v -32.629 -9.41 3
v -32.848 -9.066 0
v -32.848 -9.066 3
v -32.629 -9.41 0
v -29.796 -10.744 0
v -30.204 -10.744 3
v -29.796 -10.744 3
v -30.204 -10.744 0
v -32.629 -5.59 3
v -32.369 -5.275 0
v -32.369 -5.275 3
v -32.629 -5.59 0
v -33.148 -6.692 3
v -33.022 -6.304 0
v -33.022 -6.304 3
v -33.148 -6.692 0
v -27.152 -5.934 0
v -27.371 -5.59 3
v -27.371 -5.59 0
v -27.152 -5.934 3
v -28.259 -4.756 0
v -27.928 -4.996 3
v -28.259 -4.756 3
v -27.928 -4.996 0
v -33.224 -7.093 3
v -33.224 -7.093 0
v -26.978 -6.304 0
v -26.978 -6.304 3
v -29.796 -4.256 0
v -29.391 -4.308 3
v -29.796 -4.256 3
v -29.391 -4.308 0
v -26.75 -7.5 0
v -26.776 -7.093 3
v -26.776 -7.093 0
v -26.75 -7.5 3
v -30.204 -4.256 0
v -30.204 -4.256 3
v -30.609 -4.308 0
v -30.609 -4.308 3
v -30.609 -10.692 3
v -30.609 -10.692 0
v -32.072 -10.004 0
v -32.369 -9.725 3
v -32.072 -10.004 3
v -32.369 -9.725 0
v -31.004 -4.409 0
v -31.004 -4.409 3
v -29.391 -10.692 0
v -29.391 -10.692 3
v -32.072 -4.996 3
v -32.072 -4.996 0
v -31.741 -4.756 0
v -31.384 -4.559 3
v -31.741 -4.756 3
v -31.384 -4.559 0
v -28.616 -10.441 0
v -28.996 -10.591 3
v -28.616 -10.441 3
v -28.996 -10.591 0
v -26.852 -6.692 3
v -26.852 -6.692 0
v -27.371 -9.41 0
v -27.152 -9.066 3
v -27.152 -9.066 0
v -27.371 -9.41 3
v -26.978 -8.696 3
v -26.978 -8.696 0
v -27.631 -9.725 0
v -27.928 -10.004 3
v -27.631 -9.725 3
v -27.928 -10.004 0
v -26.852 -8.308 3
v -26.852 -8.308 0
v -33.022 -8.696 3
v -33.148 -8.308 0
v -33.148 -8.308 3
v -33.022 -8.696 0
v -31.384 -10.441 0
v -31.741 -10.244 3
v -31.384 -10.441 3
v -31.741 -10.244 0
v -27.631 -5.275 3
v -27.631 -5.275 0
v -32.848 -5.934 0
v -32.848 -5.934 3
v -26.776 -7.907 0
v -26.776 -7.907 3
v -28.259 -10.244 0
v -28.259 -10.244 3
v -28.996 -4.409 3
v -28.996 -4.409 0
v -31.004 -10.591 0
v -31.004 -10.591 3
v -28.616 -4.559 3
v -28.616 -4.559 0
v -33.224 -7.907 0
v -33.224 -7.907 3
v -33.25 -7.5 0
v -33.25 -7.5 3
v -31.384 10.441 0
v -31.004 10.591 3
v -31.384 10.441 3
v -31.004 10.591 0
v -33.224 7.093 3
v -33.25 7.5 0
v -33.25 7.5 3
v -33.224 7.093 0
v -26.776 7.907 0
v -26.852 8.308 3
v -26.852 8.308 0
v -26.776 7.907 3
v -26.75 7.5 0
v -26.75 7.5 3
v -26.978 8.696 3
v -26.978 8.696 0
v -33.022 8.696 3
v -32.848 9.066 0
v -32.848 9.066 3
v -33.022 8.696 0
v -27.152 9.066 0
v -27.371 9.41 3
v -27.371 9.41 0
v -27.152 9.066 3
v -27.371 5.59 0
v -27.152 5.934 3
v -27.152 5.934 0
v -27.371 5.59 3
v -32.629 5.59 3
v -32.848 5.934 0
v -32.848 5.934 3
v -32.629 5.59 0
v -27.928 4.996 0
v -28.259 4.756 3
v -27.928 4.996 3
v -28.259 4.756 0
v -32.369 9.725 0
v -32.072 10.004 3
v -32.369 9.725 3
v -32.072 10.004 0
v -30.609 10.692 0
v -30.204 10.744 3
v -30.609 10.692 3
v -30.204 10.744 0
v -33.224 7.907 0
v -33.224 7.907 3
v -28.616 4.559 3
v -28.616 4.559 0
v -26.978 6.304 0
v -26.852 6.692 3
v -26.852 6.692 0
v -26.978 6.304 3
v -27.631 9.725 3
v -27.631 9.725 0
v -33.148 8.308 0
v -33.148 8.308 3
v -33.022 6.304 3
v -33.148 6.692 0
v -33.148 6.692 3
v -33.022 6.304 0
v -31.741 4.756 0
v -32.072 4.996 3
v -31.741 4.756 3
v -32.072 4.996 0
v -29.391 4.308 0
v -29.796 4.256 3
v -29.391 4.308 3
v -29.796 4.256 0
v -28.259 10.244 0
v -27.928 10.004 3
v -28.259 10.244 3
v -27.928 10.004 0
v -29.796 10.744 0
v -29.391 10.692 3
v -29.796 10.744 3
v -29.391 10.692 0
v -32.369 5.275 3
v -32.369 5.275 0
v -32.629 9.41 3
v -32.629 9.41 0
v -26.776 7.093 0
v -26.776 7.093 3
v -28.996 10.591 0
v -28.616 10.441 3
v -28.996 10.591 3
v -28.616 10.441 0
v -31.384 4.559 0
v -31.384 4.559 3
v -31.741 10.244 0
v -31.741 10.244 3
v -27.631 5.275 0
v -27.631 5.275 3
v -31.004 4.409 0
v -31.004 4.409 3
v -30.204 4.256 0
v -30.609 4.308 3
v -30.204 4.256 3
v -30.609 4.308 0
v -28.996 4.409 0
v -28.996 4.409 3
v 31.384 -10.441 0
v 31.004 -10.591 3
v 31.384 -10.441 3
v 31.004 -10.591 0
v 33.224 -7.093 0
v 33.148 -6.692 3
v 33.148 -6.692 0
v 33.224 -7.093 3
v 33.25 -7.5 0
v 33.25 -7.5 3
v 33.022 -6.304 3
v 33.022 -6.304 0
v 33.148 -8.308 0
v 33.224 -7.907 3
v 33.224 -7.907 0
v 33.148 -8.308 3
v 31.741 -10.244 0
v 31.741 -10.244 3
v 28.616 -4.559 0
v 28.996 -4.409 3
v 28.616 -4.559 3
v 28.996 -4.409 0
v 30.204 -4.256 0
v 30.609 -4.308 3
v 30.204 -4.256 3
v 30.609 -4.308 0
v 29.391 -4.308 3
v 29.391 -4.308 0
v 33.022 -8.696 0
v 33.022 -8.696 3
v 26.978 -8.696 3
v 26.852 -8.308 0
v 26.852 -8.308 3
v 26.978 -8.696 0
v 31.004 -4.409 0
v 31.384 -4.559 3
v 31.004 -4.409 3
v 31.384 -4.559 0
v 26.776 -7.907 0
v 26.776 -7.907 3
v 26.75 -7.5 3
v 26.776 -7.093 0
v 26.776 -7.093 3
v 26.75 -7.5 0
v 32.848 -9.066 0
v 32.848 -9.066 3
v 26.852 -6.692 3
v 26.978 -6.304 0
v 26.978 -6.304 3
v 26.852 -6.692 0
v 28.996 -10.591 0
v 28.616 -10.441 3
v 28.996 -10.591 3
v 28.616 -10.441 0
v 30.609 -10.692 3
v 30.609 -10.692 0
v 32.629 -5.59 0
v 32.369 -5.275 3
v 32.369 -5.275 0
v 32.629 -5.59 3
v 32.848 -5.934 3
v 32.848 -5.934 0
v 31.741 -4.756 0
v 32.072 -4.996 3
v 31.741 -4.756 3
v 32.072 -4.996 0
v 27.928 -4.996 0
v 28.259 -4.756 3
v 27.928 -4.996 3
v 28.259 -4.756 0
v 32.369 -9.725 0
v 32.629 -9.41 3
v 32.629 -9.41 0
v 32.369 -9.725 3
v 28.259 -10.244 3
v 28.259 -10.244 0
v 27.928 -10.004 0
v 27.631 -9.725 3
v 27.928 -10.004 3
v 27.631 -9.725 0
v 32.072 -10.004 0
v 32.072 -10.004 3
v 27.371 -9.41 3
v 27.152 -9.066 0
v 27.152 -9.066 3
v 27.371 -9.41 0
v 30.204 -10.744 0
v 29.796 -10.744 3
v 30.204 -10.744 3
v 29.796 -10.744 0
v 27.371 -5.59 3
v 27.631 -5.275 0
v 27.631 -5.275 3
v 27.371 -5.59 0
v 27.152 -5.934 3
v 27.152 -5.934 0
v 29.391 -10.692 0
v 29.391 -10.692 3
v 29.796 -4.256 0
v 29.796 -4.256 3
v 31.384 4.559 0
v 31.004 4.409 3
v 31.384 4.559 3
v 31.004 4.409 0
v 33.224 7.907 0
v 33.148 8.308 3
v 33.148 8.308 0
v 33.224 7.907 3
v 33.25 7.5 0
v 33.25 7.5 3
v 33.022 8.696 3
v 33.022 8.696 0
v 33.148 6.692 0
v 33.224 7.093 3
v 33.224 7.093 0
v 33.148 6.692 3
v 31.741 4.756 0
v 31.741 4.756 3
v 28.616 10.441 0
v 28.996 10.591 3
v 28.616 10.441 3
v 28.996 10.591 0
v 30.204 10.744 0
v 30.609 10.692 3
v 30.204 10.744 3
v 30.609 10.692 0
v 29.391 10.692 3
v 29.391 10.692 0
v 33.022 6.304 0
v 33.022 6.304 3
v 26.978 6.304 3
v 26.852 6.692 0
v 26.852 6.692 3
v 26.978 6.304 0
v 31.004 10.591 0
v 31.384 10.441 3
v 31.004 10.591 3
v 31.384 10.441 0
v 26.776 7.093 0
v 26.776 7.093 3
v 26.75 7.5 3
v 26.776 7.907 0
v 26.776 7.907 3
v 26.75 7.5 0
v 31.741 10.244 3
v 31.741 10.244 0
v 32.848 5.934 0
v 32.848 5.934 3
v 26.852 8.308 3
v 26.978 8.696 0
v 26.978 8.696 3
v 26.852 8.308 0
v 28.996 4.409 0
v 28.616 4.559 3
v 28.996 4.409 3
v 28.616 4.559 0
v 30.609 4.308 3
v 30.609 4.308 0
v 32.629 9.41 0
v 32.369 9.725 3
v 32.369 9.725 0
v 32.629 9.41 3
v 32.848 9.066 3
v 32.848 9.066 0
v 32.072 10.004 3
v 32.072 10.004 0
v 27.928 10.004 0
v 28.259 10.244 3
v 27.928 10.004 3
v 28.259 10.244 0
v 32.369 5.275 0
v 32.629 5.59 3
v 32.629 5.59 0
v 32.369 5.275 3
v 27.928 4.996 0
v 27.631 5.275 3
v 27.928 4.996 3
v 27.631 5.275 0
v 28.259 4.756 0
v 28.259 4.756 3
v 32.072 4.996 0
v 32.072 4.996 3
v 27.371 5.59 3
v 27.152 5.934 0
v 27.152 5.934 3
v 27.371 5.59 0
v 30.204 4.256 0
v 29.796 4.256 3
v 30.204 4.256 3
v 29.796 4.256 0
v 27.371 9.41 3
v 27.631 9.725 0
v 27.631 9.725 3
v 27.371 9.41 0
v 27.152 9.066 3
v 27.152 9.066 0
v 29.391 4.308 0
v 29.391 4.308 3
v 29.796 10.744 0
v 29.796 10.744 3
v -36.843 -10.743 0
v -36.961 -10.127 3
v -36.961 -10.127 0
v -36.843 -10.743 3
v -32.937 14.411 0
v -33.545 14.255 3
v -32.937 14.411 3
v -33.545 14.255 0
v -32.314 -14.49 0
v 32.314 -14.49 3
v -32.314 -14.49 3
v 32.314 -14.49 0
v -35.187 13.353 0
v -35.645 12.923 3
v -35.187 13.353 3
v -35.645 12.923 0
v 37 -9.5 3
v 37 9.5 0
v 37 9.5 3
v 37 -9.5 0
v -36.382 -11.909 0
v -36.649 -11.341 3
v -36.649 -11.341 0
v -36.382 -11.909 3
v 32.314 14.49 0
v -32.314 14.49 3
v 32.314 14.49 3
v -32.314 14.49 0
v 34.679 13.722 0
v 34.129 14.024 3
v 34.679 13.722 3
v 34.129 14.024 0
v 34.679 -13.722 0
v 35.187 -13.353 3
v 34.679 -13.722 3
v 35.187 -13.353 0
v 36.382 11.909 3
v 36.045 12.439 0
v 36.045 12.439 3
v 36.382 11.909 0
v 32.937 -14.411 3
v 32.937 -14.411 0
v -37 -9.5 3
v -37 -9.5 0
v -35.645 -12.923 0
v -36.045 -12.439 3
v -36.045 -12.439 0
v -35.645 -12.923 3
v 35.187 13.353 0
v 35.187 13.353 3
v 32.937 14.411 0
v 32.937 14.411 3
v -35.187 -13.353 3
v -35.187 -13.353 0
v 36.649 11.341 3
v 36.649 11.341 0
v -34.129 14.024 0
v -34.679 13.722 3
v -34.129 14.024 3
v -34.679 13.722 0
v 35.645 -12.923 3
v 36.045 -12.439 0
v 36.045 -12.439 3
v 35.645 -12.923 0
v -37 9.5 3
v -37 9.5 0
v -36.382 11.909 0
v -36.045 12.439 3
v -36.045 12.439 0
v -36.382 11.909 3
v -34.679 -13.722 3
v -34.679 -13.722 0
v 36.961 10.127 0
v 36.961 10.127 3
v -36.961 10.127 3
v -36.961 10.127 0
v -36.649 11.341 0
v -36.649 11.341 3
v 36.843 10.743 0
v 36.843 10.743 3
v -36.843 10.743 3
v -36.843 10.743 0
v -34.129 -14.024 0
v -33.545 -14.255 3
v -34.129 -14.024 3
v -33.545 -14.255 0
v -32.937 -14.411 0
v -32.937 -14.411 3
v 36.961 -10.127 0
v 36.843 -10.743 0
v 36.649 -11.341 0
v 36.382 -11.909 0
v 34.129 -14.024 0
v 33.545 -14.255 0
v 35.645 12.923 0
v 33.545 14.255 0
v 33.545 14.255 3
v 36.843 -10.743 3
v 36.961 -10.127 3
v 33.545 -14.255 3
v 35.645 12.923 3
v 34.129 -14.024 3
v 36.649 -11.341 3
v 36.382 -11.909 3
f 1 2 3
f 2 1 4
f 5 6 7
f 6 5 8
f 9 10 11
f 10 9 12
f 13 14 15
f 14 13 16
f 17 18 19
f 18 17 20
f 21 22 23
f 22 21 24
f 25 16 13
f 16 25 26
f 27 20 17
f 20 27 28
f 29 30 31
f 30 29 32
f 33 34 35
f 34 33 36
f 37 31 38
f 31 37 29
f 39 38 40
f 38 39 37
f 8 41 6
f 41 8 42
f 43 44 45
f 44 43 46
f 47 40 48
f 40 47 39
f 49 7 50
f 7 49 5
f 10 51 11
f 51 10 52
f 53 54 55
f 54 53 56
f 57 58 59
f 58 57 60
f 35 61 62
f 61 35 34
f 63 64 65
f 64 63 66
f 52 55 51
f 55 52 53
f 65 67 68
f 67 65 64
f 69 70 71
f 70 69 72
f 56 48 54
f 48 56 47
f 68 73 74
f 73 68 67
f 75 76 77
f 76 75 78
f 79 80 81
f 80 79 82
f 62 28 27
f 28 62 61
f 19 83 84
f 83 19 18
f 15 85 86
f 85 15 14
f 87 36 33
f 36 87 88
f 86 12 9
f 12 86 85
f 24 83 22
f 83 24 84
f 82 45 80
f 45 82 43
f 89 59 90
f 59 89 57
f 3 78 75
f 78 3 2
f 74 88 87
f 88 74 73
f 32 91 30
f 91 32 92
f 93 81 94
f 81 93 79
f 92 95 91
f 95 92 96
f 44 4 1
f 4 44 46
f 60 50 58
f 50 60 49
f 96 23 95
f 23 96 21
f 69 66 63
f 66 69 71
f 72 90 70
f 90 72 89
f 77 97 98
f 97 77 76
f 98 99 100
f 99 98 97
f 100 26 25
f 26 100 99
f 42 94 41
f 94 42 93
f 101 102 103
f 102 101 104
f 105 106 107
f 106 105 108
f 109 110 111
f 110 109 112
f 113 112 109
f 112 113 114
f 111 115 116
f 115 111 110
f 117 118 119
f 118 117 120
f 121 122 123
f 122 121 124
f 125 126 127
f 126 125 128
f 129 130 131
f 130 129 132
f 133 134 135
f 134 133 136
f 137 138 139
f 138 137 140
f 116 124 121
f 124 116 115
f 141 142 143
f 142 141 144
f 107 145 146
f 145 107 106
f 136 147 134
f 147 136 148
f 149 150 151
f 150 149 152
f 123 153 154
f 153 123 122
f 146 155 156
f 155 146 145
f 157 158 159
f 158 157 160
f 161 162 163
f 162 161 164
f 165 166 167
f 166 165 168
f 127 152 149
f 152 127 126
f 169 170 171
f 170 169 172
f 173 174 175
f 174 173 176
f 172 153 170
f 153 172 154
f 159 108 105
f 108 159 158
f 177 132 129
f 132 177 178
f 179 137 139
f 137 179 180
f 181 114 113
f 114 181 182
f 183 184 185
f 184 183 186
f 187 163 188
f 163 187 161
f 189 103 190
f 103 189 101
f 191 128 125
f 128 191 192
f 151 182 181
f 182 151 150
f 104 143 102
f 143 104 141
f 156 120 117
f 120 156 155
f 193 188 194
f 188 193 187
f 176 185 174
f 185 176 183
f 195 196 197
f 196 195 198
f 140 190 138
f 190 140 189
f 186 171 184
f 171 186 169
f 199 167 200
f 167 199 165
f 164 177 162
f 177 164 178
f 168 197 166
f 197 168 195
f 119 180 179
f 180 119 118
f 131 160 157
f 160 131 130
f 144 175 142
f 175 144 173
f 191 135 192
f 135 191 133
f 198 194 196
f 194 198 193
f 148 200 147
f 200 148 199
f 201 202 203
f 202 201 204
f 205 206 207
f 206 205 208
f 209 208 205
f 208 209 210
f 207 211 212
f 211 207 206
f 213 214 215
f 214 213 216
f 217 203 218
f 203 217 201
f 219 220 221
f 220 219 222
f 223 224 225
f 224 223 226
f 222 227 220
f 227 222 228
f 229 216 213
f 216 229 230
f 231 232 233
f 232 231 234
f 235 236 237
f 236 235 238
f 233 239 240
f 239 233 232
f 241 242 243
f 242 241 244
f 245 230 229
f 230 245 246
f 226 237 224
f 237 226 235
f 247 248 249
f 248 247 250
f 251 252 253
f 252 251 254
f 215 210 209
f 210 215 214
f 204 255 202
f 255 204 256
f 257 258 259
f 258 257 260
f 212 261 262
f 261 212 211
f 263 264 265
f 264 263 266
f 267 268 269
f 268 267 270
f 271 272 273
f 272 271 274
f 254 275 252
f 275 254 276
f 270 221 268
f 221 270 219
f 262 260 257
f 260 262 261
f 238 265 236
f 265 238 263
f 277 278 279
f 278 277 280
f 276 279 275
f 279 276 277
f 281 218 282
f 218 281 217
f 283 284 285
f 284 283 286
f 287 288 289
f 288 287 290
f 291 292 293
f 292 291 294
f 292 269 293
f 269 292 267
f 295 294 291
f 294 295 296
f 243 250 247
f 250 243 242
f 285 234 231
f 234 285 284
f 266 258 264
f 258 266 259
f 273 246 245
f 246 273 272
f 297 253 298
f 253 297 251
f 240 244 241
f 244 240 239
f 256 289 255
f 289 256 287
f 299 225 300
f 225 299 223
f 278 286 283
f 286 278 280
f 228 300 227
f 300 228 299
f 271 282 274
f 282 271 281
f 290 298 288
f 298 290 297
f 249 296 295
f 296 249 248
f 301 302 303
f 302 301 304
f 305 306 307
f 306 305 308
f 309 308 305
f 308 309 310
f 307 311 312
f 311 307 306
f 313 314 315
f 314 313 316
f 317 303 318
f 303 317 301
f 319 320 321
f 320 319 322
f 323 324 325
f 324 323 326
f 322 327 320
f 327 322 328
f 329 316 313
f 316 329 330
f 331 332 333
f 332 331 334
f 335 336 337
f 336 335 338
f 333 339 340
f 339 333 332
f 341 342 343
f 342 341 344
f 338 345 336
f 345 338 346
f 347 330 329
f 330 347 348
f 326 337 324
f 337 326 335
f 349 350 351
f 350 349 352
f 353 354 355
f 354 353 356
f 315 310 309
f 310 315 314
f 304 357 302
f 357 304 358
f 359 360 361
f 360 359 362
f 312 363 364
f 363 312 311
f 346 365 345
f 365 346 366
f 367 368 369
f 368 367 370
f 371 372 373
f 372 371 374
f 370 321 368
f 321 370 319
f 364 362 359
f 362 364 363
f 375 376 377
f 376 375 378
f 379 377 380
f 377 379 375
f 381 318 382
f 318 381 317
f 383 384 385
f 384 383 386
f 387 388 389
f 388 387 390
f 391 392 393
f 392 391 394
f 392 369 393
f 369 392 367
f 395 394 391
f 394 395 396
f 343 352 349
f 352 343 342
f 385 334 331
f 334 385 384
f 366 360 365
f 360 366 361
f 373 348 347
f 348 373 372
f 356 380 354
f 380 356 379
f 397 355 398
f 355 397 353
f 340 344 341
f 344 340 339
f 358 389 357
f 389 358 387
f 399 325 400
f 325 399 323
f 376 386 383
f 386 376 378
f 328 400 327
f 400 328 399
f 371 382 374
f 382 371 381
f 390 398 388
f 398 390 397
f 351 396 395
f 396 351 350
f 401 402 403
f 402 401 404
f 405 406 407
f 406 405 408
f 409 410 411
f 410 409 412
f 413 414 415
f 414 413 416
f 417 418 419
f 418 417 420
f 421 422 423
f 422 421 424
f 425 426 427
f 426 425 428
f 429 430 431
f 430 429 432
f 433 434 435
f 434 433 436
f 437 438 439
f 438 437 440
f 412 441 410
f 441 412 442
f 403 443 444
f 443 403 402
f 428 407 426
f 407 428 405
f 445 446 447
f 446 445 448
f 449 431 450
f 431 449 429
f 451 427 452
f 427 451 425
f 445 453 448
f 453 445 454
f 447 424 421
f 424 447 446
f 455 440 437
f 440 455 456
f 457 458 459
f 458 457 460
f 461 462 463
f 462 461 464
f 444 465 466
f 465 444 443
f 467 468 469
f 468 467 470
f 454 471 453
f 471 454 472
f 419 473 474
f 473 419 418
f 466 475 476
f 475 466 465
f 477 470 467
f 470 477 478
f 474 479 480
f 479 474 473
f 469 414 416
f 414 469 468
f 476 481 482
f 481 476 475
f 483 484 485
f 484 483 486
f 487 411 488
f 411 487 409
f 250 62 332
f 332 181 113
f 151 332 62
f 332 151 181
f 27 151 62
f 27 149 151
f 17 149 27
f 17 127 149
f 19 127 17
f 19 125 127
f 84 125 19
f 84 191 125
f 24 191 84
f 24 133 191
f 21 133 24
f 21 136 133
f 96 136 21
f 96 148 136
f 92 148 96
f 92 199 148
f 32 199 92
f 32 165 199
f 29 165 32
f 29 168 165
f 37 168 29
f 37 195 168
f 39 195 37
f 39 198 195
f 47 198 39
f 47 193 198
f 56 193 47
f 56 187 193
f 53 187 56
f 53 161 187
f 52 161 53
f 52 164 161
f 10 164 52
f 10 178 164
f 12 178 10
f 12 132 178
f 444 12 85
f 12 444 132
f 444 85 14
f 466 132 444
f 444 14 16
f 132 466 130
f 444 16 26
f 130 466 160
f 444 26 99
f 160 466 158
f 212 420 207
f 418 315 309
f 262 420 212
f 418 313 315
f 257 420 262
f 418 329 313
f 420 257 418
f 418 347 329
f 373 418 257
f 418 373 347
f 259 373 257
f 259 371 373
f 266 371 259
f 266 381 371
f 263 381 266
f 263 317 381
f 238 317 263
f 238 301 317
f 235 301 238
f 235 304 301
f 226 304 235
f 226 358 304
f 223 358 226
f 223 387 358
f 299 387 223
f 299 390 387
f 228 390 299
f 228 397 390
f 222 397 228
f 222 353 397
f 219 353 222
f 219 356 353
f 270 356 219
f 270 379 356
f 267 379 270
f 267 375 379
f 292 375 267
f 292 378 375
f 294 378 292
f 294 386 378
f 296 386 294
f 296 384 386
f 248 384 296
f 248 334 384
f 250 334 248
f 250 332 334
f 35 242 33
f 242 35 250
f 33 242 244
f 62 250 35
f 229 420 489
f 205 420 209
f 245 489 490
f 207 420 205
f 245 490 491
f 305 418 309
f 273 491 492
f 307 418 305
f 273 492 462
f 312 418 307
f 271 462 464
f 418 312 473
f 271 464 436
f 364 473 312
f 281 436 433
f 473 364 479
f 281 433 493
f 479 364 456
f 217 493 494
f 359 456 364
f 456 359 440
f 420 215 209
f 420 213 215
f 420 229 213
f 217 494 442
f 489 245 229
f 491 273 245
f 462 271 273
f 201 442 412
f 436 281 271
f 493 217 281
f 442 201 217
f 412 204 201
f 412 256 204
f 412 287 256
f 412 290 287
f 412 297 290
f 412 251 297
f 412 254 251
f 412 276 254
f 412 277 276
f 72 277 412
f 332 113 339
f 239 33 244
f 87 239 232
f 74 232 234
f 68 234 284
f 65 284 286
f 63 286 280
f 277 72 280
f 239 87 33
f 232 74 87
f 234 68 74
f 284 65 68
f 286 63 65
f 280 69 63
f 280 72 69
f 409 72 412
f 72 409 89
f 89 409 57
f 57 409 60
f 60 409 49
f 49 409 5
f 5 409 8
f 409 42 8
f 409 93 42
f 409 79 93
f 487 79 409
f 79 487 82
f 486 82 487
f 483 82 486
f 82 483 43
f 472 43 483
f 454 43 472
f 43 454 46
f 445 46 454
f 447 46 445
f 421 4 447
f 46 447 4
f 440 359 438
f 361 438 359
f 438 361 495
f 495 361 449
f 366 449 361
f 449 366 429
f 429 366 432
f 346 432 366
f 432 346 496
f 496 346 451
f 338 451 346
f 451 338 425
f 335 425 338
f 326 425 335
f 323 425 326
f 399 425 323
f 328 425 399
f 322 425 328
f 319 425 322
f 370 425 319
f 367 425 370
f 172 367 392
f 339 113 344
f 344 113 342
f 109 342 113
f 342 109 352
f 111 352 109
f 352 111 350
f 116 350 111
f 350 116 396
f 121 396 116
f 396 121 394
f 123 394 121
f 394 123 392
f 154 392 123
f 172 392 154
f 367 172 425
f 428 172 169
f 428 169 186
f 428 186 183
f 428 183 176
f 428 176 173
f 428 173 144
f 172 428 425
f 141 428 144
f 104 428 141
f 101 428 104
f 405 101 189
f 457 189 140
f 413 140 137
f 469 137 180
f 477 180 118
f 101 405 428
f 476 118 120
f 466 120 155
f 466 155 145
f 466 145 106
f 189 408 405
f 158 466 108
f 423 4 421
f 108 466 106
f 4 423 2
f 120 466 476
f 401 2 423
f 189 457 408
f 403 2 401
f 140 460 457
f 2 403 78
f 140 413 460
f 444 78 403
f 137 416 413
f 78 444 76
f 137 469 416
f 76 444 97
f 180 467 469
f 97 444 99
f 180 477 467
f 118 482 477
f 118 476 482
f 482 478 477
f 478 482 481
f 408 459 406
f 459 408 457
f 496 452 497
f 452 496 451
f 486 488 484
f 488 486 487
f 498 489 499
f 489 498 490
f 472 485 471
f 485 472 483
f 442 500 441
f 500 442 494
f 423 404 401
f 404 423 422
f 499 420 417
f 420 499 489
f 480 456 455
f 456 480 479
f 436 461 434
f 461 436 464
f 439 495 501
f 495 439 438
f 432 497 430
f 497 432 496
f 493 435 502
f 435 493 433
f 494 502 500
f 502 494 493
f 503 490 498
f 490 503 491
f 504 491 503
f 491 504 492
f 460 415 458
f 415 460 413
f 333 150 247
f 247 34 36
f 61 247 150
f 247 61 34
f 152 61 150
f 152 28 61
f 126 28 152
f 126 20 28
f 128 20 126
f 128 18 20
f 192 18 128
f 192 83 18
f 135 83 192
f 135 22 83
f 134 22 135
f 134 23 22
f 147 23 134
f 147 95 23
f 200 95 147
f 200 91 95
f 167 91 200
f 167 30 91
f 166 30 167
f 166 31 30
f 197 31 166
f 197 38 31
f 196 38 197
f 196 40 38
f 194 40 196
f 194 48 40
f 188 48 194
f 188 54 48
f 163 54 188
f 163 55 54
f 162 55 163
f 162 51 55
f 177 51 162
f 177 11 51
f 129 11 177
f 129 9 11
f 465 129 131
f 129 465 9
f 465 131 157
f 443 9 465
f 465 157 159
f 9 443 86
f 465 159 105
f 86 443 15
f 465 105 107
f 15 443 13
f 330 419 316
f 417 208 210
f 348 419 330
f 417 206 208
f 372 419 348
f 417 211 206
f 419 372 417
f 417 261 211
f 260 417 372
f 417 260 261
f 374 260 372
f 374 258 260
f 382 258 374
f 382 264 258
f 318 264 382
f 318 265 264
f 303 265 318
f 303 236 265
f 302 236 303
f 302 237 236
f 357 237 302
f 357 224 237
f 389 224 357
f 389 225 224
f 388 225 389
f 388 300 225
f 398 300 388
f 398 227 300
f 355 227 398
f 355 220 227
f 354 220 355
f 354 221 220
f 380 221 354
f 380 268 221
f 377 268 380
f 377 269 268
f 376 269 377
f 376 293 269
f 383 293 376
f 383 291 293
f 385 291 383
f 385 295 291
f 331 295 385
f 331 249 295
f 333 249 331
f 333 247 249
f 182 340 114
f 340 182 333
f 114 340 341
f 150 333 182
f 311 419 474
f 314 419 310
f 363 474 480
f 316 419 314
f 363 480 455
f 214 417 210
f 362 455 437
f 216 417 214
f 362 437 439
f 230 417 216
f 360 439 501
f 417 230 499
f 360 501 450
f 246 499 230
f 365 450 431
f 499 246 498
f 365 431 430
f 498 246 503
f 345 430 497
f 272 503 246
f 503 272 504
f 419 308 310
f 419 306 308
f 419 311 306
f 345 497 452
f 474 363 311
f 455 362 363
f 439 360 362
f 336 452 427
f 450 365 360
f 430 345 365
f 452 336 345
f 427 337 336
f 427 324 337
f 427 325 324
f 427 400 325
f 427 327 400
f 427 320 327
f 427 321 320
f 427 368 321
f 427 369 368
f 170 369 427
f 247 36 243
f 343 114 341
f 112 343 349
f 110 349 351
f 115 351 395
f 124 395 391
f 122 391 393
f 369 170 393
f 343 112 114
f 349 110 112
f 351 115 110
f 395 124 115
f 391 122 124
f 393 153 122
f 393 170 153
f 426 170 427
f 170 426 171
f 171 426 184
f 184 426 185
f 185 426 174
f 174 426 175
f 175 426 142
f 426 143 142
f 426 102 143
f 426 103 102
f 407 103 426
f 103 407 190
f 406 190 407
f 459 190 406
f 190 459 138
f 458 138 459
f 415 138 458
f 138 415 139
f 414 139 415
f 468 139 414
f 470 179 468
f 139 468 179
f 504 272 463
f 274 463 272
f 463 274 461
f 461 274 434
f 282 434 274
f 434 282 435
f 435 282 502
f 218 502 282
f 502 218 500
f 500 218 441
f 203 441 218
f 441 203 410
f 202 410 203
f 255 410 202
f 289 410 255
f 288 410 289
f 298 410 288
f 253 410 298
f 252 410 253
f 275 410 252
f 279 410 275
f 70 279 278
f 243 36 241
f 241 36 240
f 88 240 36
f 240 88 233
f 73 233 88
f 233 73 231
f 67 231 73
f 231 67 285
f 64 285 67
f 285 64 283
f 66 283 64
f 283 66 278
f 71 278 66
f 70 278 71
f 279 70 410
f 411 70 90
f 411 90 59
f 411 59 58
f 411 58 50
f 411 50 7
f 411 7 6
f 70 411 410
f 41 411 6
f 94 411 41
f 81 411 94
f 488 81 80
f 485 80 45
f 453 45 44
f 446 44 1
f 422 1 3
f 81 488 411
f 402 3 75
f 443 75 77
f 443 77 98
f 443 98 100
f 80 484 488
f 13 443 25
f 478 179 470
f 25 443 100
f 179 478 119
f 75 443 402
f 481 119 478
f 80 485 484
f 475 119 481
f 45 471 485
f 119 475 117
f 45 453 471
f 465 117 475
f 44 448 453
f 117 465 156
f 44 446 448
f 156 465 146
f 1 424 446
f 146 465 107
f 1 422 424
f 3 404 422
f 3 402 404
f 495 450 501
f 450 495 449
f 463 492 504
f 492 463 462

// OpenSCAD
$fn = 50;


difference() {
	union() {
		hull() {
			translate(v = [-32.0000000000, 9.5000000000, 0]) {
				cylinder(h = 3, r = 5);
			}
			translate(v = [32.0000000000, 9.5000000000, 0]) {
				cylinder(h = 3, r = 5);
			}
			translate(v = [-32.0000000000, -9.5000000000, 0]) {
				cylinder(h = 3, r = 5);
			}
			translate(v = [32.0000000000, -9.5000000000, 0]) {
				cylinder(h = 3, r = 5);
			}
		}
	}
	union() {
		translate(v = [-30.0000000000, -7.5000000000, -100.0000000000]) {
			cylinder(h = 200, r = 3.2500000000);
		}
		translate(v = [-30.0000000000, 7.5000000000, -100.0000000000]) {
			cylinder(h = 200, r = 3.2500000000);
		}
		translate(v = [30.0000000000, -7.5000000000, -100.0000000000]) {
			cylinder(h = 200, r = 3.2500000000);
		}
		translate(v = [30.0000000000, 7.5000000000, -100.0000000000]) {
			cylinder(h = 200, r = 3.2500000000);
		}
	}
}
